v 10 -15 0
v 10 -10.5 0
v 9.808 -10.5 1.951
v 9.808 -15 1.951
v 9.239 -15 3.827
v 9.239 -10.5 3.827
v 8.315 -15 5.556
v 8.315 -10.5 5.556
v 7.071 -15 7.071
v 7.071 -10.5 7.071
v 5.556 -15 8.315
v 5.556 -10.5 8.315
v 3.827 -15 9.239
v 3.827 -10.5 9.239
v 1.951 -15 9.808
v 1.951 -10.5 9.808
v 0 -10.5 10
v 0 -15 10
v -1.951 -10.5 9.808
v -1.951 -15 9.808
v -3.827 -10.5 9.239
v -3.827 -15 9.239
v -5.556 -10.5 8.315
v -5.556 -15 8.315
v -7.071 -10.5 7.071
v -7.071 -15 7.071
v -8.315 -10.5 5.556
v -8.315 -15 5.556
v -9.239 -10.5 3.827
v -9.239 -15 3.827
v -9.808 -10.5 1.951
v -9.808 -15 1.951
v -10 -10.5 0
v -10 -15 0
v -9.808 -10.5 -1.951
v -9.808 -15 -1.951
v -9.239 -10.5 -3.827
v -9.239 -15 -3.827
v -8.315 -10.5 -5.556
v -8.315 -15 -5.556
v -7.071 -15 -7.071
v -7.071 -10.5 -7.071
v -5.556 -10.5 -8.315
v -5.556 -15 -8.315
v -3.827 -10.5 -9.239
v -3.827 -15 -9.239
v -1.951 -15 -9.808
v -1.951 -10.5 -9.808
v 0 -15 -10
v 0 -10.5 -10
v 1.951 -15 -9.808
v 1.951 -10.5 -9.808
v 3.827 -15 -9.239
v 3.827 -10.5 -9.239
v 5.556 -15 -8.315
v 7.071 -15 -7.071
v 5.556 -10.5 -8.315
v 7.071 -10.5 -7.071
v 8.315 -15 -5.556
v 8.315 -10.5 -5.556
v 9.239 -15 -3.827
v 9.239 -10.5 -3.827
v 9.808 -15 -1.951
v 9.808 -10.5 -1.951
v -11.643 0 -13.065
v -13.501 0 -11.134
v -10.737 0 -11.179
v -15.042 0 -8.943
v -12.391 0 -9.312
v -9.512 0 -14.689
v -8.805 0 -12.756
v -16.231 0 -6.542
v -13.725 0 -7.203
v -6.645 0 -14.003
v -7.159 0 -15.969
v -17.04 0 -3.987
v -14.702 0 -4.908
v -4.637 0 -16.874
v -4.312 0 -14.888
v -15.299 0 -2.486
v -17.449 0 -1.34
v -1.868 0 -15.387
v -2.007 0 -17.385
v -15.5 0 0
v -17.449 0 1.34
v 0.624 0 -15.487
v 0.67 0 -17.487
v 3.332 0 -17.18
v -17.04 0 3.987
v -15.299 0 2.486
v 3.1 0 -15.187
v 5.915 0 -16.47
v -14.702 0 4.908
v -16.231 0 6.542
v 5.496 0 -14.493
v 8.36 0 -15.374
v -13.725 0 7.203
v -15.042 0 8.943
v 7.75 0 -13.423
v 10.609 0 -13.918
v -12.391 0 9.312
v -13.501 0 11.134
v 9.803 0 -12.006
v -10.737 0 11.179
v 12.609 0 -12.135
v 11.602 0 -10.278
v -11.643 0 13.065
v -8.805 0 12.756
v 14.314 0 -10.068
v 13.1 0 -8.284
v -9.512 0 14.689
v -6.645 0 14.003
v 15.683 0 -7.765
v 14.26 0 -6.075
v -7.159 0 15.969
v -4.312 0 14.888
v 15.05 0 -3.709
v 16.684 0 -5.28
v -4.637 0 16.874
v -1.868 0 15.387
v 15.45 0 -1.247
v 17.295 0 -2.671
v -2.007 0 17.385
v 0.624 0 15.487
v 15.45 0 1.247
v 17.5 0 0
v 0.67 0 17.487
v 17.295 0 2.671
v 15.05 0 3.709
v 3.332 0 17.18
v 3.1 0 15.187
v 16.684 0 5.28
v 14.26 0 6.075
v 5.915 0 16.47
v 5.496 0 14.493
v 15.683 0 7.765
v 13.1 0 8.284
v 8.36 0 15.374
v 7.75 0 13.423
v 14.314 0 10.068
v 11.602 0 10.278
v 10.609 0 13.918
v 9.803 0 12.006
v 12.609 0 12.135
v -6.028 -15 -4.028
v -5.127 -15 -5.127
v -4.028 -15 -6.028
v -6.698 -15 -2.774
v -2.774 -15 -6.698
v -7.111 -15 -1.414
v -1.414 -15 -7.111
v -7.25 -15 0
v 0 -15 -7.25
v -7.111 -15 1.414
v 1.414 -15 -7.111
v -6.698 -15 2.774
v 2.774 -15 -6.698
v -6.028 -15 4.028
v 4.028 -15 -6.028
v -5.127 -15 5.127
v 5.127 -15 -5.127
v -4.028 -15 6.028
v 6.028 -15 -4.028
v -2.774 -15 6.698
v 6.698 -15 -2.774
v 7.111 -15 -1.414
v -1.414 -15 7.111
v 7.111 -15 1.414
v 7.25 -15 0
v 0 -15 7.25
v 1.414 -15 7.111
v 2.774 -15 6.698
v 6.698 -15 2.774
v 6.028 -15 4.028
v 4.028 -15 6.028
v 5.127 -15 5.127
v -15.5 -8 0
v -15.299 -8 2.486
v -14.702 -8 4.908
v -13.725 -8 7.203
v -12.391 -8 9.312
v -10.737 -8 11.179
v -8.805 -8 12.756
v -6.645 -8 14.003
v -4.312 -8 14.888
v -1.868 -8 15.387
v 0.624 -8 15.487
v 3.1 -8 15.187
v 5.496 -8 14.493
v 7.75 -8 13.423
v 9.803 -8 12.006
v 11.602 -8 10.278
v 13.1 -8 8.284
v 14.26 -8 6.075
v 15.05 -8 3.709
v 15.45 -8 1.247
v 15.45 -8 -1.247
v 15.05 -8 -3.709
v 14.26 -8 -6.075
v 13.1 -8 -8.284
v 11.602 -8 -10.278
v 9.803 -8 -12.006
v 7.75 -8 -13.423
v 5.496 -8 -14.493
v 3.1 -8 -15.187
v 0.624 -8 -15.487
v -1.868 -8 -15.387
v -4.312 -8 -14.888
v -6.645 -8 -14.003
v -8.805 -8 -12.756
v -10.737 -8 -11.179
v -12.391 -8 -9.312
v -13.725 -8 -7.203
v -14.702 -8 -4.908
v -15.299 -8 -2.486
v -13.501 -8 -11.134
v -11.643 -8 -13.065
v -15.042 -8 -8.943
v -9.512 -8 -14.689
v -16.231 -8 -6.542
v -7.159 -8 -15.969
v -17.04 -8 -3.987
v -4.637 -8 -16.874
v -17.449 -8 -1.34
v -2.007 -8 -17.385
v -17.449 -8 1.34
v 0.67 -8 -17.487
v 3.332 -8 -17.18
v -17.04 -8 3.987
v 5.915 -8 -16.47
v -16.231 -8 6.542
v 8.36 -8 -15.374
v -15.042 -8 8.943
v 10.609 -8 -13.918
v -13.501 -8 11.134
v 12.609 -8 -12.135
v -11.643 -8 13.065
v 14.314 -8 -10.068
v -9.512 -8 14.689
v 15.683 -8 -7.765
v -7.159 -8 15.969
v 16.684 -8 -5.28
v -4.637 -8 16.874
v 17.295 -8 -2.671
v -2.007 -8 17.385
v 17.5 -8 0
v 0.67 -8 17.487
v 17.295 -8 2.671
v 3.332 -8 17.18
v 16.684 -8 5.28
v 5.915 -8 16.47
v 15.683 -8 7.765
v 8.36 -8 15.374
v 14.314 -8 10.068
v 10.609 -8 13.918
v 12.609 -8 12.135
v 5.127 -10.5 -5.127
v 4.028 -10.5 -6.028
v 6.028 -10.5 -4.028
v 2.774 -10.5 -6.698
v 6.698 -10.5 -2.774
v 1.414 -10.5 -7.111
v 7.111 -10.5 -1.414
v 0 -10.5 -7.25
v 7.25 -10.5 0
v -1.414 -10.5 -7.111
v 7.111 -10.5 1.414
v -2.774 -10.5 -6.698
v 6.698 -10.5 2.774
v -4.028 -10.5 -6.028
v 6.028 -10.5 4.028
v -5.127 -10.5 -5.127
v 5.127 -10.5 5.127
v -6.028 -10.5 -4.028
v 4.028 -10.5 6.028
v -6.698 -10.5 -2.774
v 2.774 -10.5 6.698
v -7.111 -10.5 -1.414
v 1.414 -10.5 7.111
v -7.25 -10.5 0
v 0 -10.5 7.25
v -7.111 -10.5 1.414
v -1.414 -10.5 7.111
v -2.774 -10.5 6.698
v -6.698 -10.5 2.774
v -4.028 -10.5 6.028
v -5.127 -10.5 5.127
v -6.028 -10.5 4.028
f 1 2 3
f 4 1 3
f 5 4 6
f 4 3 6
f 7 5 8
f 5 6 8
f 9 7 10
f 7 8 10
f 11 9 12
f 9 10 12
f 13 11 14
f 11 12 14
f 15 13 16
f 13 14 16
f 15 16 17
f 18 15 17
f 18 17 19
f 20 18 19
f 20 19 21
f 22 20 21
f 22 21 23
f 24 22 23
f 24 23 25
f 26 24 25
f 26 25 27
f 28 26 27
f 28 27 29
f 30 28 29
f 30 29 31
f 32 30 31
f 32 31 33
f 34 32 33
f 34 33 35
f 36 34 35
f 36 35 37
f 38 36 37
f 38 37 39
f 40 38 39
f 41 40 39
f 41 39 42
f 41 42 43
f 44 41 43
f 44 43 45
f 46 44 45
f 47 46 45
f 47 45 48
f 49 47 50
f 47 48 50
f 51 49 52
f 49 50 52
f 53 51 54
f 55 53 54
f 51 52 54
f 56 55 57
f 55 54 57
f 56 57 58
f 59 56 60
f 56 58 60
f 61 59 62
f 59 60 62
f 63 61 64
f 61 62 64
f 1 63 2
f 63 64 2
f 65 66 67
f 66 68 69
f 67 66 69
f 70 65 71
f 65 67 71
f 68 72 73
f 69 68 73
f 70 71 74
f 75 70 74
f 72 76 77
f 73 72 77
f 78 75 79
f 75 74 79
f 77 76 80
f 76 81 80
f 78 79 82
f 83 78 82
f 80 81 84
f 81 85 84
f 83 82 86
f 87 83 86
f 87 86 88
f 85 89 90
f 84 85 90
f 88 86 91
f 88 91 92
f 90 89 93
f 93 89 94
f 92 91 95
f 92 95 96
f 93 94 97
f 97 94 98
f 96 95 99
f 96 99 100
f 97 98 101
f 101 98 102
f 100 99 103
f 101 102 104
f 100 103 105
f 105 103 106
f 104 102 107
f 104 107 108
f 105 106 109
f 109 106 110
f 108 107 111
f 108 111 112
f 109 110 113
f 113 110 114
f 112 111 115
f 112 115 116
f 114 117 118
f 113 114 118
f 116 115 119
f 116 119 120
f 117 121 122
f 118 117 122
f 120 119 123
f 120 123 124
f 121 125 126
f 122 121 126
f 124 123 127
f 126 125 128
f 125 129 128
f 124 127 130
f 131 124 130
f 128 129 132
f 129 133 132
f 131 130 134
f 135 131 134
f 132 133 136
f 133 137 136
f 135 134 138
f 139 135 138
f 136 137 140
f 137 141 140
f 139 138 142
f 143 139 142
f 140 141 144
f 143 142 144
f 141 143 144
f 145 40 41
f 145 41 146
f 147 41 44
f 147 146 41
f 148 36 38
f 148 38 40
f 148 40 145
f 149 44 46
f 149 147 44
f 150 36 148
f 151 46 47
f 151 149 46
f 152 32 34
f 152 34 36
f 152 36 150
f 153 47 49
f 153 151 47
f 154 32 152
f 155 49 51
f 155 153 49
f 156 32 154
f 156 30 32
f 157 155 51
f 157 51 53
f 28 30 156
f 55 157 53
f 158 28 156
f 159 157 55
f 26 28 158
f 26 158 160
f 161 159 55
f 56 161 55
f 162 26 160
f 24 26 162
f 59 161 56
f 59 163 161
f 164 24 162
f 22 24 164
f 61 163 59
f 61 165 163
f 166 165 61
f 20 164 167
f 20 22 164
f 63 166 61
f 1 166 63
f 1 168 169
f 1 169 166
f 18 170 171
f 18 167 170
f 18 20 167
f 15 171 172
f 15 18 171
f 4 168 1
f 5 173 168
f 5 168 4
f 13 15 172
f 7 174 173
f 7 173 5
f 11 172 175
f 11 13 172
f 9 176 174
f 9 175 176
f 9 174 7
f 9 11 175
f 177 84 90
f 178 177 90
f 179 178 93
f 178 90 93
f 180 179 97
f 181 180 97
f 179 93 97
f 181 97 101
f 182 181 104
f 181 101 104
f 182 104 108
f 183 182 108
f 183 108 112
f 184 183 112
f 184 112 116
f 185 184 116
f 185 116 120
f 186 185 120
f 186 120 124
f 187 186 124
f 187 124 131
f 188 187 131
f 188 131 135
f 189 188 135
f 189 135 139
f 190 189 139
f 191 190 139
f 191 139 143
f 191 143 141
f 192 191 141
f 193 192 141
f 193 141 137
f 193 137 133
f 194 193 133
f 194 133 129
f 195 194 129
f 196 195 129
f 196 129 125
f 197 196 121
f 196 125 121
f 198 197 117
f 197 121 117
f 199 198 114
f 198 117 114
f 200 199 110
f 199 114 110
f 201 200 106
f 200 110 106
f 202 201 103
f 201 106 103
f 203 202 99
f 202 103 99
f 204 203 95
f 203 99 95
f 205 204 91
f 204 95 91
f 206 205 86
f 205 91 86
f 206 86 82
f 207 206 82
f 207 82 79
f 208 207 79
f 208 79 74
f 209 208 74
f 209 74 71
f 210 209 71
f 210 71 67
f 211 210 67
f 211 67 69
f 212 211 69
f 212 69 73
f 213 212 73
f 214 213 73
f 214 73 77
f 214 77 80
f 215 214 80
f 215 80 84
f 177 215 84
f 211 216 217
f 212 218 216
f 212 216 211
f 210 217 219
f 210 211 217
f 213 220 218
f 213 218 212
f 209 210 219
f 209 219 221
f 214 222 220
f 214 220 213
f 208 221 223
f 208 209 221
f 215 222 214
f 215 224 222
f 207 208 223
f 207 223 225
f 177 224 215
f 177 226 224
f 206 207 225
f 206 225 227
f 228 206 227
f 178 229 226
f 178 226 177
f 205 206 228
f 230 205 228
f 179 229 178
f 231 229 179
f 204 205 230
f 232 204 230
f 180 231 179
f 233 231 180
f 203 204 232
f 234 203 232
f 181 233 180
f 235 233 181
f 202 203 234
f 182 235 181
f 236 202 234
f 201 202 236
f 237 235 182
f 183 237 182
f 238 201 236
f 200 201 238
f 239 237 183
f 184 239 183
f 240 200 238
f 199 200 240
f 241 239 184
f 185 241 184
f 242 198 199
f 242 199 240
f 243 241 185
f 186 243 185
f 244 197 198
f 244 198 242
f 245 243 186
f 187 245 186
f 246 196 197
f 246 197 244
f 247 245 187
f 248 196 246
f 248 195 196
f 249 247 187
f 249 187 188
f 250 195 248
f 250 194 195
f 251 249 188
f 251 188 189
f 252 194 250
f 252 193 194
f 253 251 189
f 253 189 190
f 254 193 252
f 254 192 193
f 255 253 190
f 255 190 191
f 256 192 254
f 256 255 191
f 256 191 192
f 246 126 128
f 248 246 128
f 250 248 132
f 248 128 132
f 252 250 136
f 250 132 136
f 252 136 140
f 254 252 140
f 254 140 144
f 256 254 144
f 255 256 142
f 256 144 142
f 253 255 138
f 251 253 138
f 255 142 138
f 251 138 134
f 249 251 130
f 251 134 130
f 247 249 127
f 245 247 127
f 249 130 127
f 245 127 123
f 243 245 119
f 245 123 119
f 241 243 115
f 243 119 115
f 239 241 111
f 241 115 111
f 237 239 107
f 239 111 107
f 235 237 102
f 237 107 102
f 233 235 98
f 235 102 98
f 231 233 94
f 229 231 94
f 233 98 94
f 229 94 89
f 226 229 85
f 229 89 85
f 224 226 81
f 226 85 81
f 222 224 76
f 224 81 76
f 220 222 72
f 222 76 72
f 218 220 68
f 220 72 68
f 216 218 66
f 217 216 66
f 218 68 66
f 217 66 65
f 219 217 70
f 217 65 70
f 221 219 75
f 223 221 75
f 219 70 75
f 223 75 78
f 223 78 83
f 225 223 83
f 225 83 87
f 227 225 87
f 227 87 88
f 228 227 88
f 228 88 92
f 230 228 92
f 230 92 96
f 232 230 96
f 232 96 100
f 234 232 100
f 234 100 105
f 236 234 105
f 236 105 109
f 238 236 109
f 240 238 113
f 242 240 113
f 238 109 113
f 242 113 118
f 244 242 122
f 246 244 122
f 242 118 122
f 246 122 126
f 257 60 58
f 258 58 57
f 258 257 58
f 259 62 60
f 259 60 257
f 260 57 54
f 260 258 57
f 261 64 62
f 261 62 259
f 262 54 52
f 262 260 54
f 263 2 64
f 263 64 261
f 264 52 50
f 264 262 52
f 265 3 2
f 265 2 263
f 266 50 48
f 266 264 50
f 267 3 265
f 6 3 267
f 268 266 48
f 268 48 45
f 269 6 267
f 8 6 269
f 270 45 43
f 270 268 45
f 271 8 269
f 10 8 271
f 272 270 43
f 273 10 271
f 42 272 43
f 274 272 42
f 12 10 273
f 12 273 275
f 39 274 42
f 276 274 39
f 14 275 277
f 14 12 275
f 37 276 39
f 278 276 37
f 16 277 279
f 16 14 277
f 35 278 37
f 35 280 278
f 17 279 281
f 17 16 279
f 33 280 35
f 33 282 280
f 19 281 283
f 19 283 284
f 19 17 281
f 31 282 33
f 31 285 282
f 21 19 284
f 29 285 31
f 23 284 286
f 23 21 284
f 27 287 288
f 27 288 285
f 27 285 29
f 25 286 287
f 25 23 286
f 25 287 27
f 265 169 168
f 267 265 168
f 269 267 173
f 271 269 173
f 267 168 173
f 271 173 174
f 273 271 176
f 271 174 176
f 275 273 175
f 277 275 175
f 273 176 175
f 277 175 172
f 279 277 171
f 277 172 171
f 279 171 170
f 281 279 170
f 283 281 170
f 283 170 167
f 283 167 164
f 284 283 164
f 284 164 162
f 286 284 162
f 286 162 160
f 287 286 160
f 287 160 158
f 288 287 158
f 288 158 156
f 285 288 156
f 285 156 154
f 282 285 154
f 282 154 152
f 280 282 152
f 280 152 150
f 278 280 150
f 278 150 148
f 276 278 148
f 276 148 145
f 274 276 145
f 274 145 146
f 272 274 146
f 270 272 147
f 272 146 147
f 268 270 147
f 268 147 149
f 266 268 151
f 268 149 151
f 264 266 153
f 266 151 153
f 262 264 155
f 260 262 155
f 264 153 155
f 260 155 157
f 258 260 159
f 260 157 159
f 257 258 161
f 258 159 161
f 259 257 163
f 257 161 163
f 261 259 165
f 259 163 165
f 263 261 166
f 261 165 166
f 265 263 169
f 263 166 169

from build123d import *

# Parameters (mm, degrees)
F0_R     = 17.5
F1_DEPTH = 8
F2_R     = 10
F3_DEPTH = 7
F4_R     = 7.25
F5_DEPTH = 25
F6_R     = 15.5
F7_DEPTH = 10.5


with BuildPart() as f1:
    # F0 (on Front) → F1 (new body)
    with BuildSketch(Plane.XZ):
        Circle(F0_R)
    extrude(amount=F1_DEPTH)

    # F2 (on face) → F3 (join)
    with BuildSketch(Plane.XZ.offset(8)):
        Circle(F2_R)
    extrude(amount=F3_DEPTH)

    # F4 (on face) → F5 (cut)
    with BuildSketch(Plane.XZ.offset(15)):
        Circle(F4_R)
    extrude(amount=-F5_DEPTH, mode=Mode.SUBTRACT)

    # F6 (on face) → F7 (cut)
    with BuildSketch(Plane(origin=(0, 0, 0), x_dir=(-1, 0, 0), z_dir=(0, 1, 0))):
        Circle(F6_R)
    extrude(amount=-F7_DEPTH, mode=Mode.SUBTRACT)


solid = f1.part
